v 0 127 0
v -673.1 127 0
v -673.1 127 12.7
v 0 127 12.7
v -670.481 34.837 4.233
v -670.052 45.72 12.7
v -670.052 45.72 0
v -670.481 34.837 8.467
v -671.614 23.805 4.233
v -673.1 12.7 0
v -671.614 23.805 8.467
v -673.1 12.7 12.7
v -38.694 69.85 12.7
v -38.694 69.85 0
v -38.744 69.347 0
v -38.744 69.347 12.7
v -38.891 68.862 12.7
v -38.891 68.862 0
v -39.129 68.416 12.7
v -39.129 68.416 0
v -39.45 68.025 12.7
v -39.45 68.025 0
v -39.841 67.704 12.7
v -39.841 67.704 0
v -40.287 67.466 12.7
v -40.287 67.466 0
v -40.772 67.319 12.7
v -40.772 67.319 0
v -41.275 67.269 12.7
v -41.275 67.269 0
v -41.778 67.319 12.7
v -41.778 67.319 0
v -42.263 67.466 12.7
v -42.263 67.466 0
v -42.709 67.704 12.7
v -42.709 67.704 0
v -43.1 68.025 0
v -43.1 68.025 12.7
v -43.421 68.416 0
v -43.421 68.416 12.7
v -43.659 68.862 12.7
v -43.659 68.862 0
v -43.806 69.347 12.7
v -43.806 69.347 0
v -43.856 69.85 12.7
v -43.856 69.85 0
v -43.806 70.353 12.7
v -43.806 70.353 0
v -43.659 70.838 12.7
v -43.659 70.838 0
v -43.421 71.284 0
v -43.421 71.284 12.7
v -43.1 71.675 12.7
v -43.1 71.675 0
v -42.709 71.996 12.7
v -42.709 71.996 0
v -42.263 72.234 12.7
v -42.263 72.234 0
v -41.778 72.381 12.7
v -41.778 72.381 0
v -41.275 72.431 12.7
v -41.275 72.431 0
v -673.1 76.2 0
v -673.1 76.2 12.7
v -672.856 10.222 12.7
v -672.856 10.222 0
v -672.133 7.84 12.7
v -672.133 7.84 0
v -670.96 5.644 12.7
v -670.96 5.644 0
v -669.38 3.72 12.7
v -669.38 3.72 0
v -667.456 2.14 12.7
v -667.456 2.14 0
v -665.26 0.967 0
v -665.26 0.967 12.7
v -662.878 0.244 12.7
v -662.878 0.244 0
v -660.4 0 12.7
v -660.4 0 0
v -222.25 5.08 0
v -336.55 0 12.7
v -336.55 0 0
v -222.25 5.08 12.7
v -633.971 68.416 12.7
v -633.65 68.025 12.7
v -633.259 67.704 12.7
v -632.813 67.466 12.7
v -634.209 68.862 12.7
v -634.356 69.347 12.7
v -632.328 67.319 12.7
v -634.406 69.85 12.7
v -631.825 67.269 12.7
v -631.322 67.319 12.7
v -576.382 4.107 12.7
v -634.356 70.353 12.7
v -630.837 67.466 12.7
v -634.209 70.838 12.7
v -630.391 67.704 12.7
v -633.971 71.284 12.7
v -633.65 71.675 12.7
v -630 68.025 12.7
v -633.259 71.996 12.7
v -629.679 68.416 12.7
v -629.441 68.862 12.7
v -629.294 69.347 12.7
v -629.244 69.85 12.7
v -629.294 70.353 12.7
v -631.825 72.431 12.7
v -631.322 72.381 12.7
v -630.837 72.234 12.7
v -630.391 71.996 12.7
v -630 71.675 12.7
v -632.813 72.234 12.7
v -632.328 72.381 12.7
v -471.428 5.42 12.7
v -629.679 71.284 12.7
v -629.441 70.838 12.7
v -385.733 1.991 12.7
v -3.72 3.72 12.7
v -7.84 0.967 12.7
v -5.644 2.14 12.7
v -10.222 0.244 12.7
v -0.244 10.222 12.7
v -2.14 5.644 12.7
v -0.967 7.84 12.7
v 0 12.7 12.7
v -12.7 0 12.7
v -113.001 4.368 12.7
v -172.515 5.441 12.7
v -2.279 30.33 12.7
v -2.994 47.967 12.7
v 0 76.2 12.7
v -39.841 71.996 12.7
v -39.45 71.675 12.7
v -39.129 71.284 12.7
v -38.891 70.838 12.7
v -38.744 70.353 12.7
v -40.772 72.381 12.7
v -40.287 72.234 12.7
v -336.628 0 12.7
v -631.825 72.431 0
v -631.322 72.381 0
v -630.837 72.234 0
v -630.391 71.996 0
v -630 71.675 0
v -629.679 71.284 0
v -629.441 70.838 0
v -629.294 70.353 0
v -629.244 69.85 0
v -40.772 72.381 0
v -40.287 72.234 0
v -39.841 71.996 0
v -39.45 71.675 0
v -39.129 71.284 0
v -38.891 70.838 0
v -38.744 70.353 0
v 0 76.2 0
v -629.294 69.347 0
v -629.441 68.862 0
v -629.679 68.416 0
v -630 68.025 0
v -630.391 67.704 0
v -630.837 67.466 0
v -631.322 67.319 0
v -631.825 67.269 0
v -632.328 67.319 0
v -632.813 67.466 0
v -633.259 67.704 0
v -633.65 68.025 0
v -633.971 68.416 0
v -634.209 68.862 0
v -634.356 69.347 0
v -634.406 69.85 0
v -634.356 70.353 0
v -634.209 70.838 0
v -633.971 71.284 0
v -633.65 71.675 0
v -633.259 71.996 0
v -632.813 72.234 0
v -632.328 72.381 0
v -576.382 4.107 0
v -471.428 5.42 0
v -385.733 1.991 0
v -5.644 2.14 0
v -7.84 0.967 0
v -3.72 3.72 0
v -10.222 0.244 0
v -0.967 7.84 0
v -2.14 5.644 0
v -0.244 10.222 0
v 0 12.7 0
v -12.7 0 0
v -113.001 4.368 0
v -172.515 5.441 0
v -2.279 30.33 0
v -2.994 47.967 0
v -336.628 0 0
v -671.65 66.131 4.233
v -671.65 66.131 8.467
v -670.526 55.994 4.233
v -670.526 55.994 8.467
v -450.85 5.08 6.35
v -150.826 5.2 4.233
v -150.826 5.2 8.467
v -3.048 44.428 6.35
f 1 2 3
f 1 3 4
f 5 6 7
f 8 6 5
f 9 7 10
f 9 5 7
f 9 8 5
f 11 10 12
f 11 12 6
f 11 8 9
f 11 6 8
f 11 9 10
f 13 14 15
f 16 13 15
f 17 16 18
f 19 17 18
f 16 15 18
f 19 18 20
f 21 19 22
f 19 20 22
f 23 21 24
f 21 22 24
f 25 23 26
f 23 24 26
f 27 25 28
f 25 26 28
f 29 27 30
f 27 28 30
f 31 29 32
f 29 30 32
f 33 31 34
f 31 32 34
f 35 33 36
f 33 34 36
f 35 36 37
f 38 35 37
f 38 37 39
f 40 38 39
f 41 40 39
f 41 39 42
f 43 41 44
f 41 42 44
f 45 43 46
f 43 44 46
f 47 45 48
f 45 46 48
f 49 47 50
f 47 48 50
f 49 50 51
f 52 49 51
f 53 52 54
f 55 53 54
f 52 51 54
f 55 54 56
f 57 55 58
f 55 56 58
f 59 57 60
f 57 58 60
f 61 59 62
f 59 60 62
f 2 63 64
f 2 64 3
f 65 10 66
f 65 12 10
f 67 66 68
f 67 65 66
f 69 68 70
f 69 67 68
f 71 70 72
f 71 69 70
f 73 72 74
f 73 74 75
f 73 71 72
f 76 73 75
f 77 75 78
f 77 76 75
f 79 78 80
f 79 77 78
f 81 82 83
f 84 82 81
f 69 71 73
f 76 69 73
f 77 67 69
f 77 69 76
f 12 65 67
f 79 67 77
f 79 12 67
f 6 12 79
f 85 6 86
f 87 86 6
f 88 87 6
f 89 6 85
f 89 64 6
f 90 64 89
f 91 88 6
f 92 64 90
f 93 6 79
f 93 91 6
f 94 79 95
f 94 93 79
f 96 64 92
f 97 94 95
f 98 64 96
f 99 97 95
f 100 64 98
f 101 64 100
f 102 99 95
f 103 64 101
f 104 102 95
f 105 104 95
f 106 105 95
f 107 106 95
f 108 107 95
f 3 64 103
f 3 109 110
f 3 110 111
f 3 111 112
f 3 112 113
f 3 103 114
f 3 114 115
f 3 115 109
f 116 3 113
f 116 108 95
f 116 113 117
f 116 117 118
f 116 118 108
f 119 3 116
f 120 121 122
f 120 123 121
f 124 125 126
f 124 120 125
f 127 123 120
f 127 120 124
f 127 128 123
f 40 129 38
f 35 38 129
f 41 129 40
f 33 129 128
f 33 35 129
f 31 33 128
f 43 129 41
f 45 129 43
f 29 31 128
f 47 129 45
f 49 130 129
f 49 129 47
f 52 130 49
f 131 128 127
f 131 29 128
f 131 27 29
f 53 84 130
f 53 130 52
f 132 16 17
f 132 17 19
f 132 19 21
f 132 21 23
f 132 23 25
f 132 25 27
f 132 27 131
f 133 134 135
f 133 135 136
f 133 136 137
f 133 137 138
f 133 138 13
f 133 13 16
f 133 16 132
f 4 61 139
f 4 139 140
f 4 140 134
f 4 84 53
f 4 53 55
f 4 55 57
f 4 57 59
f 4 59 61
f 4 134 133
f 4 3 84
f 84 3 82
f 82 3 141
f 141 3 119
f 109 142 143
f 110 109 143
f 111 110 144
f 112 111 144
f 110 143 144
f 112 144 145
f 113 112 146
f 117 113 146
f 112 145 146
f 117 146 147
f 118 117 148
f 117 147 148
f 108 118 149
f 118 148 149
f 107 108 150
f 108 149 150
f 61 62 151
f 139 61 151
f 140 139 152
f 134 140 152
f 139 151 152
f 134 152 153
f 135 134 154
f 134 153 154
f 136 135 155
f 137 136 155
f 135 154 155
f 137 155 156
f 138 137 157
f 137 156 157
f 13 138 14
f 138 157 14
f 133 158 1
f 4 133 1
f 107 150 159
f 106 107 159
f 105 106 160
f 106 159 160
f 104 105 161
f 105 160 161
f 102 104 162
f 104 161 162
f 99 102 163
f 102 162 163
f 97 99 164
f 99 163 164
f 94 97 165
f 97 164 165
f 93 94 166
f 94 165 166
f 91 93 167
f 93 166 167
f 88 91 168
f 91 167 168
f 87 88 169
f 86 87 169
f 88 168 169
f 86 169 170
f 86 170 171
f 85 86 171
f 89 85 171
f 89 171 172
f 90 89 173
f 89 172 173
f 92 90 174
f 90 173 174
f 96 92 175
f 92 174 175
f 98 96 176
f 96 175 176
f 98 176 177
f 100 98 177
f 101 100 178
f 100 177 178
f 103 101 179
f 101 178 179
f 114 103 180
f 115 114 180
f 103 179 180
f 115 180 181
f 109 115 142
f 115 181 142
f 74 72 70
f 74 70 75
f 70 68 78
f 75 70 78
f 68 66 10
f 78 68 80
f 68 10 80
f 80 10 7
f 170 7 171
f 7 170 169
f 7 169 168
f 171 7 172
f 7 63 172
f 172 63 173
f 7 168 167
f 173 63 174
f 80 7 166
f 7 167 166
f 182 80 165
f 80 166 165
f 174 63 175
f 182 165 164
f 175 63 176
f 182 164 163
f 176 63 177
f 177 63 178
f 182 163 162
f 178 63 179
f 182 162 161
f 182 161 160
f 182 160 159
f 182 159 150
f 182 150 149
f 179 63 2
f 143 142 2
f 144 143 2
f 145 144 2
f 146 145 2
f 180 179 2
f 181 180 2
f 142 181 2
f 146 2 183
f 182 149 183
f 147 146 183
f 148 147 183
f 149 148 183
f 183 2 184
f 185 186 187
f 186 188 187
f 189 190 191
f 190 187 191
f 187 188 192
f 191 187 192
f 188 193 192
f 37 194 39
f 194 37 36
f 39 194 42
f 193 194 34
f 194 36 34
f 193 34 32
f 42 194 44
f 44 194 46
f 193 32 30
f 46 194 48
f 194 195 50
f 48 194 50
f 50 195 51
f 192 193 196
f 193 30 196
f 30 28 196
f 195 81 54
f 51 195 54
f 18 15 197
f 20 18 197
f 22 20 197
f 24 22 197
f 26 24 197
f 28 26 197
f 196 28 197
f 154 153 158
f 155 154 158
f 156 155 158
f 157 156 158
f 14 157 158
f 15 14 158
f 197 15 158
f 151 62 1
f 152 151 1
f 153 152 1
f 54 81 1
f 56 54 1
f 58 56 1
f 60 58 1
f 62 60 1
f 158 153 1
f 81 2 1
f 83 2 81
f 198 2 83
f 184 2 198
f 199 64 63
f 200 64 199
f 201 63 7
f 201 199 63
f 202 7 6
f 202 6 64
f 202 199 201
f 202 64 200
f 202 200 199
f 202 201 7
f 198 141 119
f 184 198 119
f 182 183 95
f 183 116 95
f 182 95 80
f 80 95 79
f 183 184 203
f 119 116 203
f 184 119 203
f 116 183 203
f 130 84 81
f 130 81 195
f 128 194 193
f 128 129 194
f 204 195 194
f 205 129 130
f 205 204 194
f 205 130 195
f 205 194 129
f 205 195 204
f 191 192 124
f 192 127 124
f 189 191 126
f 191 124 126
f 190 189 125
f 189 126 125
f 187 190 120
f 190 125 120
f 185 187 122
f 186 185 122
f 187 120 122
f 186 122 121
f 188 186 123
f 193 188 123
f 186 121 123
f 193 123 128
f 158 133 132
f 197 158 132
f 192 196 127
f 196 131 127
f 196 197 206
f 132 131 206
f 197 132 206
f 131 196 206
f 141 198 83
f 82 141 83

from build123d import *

# Parameters (mm, degrees)
F0_W     = 673.1
F0_H     = 127
F1_DEPTH = 12.7
F3_DEPTH = 12.7
F4_R     = 12.69999
F6_DEPTH = 12.7


# Not quite as in the source:
# - a fillet or chamfer is up to 0.001 mm smaller than in the source, because OpenCascade refuses the exact size
# - ends of sketch curves that miss each other by under 0.0002 mm in the source are joined


with BuildPart() as f1:
    # F0 (on Top) → F1 (new body)
    with BuildSketch(Plane.XY):
        with Locations((-336.55, 63.5)):
            Rectangle(F0_W, F0_H)
    extrude(amount=F1_DEPTH)

    # F2 (on face) → F3 (cut)
    with BuildSketch(Plane.XY.offset(12.7)):
        with BuildLine():
            Line((-660.4, 0), (-450.85, 0))
            Line((-450.85, 0), (-450.85, 5.08))
            add(Edge.make_bspline(
                [(-660.4, 0), (-618.4280983715, 3.4161410723), (-518.2102721788, 6.7061283939), (-450.85, 5.08)],
                knots=[0, 0, 0, 0, 0.2875538304, 0.2875538304, 0.2875538304, 0.2875538304], degree=3))
        make_face()
        with BuildLine():
            Line((-450.85, 5.08), (-450.85, 0))
            Line((-450.85, 0), (-336.6277222604, 0))
            add(Edge.make_bspline(
                [(-450.85, 5.08), (-401.1233292925, 3.8795602073), (-369.3029781403, -5.9421e-06), (-336.6277222604, 0)],
                knots=[0.2875538304, 0.2875538304, 0.2875538304, 0.2875538304, 0.4998316935, 0.4998316935, 0.4998316935, 0.4998316935], degree=3))
        make_face()
        with BuildLine():
            add(Edge.make_bspline(
                [(-336.6277222604, -7.3164e-06), (-336.6018153808, -7.3175e-06), (-303.8740668477, 0.0030721325), (-270.2737779375, 3.9032465323), (-222.25, 5.08)],
                knots=[0.4998316935, 0.4998316935, 0.4998316935, 0.4998316935, 0.5, 0.7124461696, 0.7124461696, 0.7124461696, 0.7124461696], degree=3))
            Line((-336.6277222604, -7.3164e-06), (-222.25, 0))
            Line((-222.25, 0), (-222.25, 5.08))
        make_face()
        with BuildLine():
            add(Edge.make_bspline(
                [(-222.25, 5.08), (-157.2480217343, 6.6727797981), (-65.7725673543, 3.2817360247), (-12.7, 0)],
                knots=[0.7124461696, 0.7124461696, 0.7124461696, 0.7124461696, 1, 1, 1, 1], degree=3))
            Line((-222.25, 5.08), (-222.25, 0))
            Line((-222.25, 0), (-12.7, 0))
        make_face()
        with BuildLine():
            add(Edge.make_bspline(
                [(0, 76.2), (-1.5243553143, 65.6073133136), (-3.0487106286, 55.0146266272), (-3.048, 44.4275960326)],
                knots=[0, 0, 0, 0, 0.5001747983, 0.5001747983, 0.5001747983, 0.5001747983], degree=3))
            Line((-3.048, 44.4275960326), (0, 44.4275960326))
            Line((0, 44.4275960326), (0, 76.2))
        make_face()
        with BuildLine():
            add(Edge.make_bspline(
                [(-3.048, 44.4275960326), (-3.0472898681, 33.8479652297), (-1.523644934, 23.2739826149), (0, 12.7)],
                knots=[0.5001747983, 0.5001747983, 0.5001747983, 0.5001747983, 1, 1, 1, 1], degree=3))
            Line((0, 12.7), (0, 44.4275960326))
            Line((0, 44.4275960326), (-3.048, 44.4275960326))
        make_face()
        with BuildLine():
            Line((-673.1, 45.72), (-670.052, 45.72))
            add(Edge.make_bspline(
                [(-673.1, 76.2), (-671.5957505111, 66.1426093711), (-670.0915010221, 56.0852187422), (-670.052, 45.72)],
                knots=[0, 0, 0, 0, 0.4900875678, 0.4900875678, 0.4900875678, 0.4900875678], degree=3))
            Line((-673.1, 76.2), (-673.1, 45.72))
        make_face()
        with BuildLine():
            Line((-673.1, 45.72), (-673.1, 12.7))
            add(Edge.make_bspline(
                [(-670.052, 45.72), (-670.0109010952, 34.9354907678), (-671.5554505476, 23.8177453839), (-673.1, 12.7)],
                knots=[0.4900875678, 0.4900875678, 0.4900875678, 0.4900875678, 1, 1, 1, 1], degree=3))
            Line((-670.052, 45.72), (-673.1, 45.72))
        make_face()
    extrude(amount=-F3_DEPTH, mode=Mode.SUBTRACT)

    # F4 (radius 12.7 in the source; OpenCascade refuses exactly that, so slightly less here)
    f4_edges = [f1.edges().sort_by_distance(p)[0] for p in [
        (-673.1, 0, 6.35),
        (0, 0, 6.35),
    ]]
    fillet(f4_edges, radius=F4_R)

    # F5 (on face) → F6 (cut)
    with BuildSketch(Plane(origin=(0, 0, 0), x_dir=(1, 0, 0), z_dir=(0, 0, -1))):
        with BuildLine():
            ThreePointArc((-38.69436, -69.85), (-43.0997880438, -68.0252119562), (-41.275, -72.43064))
            ThreePointArc((-41.275, -72.43064), (-39.4502119562, -71.6747880438), (-38.69436, -69.85))
        make_face()
        with BuildLine():
            ThreePointArc((-629.24436, -69.85), (-633.6497880438, -68.0252119562), (-631.825, -72.43064))
            ThreePointArc((-631.825, -72.43064), (-630.0002119562, -71.6747880438), (-629.24436, -69.85))
        make_face()
    extrude(amount=-F6_DEPTH, mode=Mode.SUBTRACT)


solid = f1.part
